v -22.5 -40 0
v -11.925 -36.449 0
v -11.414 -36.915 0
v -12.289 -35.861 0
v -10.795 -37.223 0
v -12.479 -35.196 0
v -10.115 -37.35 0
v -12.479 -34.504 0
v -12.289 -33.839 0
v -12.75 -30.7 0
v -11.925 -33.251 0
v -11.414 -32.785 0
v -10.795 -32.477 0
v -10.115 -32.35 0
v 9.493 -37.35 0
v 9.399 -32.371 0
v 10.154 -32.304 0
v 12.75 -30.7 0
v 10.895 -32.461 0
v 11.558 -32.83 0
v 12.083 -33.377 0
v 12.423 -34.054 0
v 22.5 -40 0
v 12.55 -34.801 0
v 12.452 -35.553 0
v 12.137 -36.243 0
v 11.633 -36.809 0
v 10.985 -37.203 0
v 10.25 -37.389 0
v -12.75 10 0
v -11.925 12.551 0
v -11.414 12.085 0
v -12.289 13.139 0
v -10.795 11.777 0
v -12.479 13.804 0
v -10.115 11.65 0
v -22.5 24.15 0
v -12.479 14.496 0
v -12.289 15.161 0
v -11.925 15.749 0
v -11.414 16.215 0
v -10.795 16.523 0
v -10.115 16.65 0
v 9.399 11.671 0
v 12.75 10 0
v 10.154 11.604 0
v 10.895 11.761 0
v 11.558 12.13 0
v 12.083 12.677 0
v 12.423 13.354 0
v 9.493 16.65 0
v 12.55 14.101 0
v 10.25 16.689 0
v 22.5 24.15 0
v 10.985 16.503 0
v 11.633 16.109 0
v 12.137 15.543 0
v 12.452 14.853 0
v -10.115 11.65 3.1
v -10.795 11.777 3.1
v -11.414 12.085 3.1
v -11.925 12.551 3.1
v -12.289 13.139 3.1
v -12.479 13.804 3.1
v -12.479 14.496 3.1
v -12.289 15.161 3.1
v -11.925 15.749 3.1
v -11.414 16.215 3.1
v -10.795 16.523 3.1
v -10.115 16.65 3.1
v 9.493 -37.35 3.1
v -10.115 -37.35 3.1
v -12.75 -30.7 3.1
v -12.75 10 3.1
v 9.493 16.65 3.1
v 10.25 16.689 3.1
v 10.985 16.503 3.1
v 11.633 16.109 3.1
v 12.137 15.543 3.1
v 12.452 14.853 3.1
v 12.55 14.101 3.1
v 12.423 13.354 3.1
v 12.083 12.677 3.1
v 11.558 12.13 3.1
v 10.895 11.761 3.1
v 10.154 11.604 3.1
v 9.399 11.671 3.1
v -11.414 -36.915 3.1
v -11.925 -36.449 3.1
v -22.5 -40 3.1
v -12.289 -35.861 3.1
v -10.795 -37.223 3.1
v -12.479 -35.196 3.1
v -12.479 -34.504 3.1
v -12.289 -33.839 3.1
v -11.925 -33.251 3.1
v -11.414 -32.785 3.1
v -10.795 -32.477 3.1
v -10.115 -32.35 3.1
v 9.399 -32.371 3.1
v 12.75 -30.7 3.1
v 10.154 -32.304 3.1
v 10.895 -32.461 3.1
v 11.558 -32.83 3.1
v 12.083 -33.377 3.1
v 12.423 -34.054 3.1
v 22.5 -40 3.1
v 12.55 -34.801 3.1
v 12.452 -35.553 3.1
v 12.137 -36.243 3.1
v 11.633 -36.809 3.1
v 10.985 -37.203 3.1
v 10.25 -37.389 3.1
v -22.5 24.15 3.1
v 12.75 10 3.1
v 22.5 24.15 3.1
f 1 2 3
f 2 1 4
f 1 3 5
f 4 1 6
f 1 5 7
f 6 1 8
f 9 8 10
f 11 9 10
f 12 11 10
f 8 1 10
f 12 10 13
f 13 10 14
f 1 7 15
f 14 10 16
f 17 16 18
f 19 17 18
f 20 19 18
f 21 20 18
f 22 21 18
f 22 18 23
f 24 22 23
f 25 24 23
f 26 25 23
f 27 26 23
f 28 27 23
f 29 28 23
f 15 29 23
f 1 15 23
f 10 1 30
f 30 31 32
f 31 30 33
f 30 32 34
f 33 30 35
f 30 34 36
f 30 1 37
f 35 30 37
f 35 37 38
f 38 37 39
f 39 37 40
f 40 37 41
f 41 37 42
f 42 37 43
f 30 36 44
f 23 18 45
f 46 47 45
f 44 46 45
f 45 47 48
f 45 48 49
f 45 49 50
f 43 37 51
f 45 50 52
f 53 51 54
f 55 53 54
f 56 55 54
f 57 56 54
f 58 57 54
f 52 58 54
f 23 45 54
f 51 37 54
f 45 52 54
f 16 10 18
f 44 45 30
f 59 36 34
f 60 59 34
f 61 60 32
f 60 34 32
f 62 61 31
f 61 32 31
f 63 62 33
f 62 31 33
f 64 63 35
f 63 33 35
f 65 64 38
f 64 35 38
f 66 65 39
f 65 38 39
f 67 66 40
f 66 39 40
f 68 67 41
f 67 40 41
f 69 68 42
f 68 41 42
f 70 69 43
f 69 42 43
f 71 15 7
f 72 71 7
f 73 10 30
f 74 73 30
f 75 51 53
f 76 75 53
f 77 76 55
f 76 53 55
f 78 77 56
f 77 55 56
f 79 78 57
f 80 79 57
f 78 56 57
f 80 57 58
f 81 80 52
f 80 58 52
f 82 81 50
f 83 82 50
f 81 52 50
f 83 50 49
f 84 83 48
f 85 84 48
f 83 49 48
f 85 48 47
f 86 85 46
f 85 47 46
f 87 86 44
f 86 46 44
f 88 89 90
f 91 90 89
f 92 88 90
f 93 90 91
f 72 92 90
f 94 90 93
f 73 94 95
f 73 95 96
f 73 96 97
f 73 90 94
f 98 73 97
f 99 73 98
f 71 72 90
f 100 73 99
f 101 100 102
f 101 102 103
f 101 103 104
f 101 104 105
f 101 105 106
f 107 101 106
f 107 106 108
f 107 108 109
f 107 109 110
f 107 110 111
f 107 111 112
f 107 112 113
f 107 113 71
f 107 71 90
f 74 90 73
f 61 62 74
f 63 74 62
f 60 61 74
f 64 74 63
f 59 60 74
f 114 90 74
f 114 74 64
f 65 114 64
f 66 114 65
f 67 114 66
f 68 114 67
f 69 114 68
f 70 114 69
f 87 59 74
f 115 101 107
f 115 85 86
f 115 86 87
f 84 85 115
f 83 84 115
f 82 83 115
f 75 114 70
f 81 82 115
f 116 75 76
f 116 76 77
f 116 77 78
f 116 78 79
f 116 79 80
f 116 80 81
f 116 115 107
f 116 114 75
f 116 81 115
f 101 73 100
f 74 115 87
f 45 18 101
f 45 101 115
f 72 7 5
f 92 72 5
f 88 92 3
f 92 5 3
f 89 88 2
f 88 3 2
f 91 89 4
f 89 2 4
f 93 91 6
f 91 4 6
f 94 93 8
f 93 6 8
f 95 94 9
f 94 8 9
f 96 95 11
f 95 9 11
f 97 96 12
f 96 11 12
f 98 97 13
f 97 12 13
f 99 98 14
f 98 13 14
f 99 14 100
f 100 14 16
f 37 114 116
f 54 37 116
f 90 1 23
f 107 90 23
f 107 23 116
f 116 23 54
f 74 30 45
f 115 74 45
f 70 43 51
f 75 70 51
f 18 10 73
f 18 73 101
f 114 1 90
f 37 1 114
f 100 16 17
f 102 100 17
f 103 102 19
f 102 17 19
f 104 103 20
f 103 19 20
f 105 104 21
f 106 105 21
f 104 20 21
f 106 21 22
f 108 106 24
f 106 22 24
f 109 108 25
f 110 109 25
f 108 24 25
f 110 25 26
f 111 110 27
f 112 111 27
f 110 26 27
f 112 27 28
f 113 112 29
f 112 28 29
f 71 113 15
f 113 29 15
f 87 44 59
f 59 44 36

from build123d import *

# Parameters (mm, degrees)
SKETCH1_W           = 45
SKETCH1_H           = 80
SKETCH1_W_2         = 25.5
SKETCH1_H_2         = 40.7
BOSS_EXTRUDE1_DEPTH = 3.1
SKETCH8_W           = 45
SKETCH8_H           = 15.85
CUT_EXTRUDE4_DEPTH  = 4.1


with BuildPart() as part:
    # Sketch1 → Boss-Extrude1 (new body)
    with BuildSketch(Plane.XY):
        Rectangle(SKETCH1_W, SKETCH1_H)
        with Locations((0, -10.35)):
            Rectangle(SKETCH1_W_2, SKETCH1_H_2, mode=Mode.SUBTRACT)
        with BuildLine():
            Line((-10.115047428, 16.65), (9.493300094, 16.65))
            ThreePointArc((9.493300094, 16.65), (12.550371011, 14.101497401), (9.398611565, 11.671073469))
            Line((9.398611565, 11.671073469), (-10.115047428, 11.65))
            ThreePointArc((-10.115047428, 11.65), (-12.502645782, 14.15), (-10.115047428, 16.65))
        make_face(mode=Mode.SUBTRACT)
        with BuildLine():
            Line((-10.115047428, -32.35), (9.398611565, -32.371073469))
            ThreePointArc((9.398611565, -32.371073469), (12.550371011, -34.801497401), (9.493300094, -37.35))
            Line((9.493300094, -37.35), (-10.115047428, -37.35))
            ThreePointArc((-10.115047428, -37.35), (-12.502645782, -34.85), (-10.115047428, -32.35))
        make_face(mode=Mode.SUBTRACT)
    extrude(amount=BOSS_EXTRUDE1_DEPTH)

    # Sketch8 → Cut-Extrude4 (cut, through all)
    with BuildSketch(Plane.XY.offset(3.1)):
        with Locations((0, 32.075)):
            Rectangle(SKETCH8_W, SKETCH8_H)
    extrude(amount=-CUT_EXTRUDE4_DEPTH, mode=Mode.SUBTRACT)


solid = part.part
